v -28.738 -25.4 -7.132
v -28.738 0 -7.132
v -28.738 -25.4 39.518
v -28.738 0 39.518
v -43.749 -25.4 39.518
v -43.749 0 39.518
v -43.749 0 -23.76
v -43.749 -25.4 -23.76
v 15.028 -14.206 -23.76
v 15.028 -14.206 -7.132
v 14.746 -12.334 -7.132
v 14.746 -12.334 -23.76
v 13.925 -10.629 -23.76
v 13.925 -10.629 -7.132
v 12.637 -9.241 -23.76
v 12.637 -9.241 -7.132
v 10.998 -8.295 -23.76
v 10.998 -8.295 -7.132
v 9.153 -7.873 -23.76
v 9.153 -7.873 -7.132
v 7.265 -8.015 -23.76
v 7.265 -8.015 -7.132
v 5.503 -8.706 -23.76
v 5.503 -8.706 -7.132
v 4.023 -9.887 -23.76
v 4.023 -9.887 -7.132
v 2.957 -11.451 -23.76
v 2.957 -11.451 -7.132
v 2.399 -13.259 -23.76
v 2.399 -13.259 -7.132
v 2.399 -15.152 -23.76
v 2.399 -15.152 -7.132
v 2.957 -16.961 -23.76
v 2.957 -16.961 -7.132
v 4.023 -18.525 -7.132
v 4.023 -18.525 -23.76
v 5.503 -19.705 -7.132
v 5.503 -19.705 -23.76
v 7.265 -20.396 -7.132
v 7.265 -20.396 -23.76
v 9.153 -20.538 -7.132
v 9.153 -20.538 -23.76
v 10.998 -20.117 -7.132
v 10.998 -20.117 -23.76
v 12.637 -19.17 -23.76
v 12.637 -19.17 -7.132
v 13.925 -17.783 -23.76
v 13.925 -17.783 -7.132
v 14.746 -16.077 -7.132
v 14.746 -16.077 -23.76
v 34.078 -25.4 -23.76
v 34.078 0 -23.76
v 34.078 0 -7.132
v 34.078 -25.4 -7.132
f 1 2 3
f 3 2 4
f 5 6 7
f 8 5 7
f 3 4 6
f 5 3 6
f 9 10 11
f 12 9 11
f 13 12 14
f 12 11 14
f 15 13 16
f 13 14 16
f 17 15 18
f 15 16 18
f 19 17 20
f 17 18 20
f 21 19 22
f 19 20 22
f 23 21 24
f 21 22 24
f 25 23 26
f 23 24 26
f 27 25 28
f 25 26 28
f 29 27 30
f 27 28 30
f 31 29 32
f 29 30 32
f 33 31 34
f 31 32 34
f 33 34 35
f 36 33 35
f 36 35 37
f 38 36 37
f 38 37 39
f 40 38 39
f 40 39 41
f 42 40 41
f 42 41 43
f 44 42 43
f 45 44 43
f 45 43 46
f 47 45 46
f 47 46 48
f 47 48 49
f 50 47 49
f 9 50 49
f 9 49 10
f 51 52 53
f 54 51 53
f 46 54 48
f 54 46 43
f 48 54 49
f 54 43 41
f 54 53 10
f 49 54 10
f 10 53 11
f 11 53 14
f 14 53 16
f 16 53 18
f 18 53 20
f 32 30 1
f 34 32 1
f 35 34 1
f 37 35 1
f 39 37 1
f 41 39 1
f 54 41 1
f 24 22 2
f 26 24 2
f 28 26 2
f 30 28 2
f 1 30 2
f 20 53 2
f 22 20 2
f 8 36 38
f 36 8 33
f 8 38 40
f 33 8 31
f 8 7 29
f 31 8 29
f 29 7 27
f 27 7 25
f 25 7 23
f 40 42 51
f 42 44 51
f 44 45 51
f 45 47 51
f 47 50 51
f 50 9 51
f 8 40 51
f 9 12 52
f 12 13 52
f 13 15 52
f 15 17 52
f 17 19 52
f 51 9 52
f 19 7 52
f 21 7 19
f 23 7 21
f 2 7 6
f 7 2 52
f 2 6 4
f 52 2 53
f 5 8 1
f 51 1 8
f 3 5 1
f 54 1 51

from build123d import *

# Parameters (mm, degrees)
F1_DEPTH = 25.4
F2_R     = 6.35
F3_DEPTH = 25.4


with BuildPart() as f1:
    # F0 (on Front) → F1 (new body)
    with BuildSketch(Plane.XZ):
        Polygon((-28.737951, 39.518028), (-43.749195, 39.518028), (-43.749195, -23.760144), (-28.737951, -23.760144), (34.078334, -23.760144), (34.078334, -7.132303), (-28.737951, -7.132303), align=None)
    extrude(amount=F1_DEPTH)

    # F2 (on face) → F3 (cut)
    with BuildSketch(Plane.XY.offset(-7.132303)):
        with Locations((8.678334, -14.20567)):
            Circle(F2_R)
    extrude(amount=-F3_DEPTH, mode=Mode.SUBTRACT)


solid = f1.part
